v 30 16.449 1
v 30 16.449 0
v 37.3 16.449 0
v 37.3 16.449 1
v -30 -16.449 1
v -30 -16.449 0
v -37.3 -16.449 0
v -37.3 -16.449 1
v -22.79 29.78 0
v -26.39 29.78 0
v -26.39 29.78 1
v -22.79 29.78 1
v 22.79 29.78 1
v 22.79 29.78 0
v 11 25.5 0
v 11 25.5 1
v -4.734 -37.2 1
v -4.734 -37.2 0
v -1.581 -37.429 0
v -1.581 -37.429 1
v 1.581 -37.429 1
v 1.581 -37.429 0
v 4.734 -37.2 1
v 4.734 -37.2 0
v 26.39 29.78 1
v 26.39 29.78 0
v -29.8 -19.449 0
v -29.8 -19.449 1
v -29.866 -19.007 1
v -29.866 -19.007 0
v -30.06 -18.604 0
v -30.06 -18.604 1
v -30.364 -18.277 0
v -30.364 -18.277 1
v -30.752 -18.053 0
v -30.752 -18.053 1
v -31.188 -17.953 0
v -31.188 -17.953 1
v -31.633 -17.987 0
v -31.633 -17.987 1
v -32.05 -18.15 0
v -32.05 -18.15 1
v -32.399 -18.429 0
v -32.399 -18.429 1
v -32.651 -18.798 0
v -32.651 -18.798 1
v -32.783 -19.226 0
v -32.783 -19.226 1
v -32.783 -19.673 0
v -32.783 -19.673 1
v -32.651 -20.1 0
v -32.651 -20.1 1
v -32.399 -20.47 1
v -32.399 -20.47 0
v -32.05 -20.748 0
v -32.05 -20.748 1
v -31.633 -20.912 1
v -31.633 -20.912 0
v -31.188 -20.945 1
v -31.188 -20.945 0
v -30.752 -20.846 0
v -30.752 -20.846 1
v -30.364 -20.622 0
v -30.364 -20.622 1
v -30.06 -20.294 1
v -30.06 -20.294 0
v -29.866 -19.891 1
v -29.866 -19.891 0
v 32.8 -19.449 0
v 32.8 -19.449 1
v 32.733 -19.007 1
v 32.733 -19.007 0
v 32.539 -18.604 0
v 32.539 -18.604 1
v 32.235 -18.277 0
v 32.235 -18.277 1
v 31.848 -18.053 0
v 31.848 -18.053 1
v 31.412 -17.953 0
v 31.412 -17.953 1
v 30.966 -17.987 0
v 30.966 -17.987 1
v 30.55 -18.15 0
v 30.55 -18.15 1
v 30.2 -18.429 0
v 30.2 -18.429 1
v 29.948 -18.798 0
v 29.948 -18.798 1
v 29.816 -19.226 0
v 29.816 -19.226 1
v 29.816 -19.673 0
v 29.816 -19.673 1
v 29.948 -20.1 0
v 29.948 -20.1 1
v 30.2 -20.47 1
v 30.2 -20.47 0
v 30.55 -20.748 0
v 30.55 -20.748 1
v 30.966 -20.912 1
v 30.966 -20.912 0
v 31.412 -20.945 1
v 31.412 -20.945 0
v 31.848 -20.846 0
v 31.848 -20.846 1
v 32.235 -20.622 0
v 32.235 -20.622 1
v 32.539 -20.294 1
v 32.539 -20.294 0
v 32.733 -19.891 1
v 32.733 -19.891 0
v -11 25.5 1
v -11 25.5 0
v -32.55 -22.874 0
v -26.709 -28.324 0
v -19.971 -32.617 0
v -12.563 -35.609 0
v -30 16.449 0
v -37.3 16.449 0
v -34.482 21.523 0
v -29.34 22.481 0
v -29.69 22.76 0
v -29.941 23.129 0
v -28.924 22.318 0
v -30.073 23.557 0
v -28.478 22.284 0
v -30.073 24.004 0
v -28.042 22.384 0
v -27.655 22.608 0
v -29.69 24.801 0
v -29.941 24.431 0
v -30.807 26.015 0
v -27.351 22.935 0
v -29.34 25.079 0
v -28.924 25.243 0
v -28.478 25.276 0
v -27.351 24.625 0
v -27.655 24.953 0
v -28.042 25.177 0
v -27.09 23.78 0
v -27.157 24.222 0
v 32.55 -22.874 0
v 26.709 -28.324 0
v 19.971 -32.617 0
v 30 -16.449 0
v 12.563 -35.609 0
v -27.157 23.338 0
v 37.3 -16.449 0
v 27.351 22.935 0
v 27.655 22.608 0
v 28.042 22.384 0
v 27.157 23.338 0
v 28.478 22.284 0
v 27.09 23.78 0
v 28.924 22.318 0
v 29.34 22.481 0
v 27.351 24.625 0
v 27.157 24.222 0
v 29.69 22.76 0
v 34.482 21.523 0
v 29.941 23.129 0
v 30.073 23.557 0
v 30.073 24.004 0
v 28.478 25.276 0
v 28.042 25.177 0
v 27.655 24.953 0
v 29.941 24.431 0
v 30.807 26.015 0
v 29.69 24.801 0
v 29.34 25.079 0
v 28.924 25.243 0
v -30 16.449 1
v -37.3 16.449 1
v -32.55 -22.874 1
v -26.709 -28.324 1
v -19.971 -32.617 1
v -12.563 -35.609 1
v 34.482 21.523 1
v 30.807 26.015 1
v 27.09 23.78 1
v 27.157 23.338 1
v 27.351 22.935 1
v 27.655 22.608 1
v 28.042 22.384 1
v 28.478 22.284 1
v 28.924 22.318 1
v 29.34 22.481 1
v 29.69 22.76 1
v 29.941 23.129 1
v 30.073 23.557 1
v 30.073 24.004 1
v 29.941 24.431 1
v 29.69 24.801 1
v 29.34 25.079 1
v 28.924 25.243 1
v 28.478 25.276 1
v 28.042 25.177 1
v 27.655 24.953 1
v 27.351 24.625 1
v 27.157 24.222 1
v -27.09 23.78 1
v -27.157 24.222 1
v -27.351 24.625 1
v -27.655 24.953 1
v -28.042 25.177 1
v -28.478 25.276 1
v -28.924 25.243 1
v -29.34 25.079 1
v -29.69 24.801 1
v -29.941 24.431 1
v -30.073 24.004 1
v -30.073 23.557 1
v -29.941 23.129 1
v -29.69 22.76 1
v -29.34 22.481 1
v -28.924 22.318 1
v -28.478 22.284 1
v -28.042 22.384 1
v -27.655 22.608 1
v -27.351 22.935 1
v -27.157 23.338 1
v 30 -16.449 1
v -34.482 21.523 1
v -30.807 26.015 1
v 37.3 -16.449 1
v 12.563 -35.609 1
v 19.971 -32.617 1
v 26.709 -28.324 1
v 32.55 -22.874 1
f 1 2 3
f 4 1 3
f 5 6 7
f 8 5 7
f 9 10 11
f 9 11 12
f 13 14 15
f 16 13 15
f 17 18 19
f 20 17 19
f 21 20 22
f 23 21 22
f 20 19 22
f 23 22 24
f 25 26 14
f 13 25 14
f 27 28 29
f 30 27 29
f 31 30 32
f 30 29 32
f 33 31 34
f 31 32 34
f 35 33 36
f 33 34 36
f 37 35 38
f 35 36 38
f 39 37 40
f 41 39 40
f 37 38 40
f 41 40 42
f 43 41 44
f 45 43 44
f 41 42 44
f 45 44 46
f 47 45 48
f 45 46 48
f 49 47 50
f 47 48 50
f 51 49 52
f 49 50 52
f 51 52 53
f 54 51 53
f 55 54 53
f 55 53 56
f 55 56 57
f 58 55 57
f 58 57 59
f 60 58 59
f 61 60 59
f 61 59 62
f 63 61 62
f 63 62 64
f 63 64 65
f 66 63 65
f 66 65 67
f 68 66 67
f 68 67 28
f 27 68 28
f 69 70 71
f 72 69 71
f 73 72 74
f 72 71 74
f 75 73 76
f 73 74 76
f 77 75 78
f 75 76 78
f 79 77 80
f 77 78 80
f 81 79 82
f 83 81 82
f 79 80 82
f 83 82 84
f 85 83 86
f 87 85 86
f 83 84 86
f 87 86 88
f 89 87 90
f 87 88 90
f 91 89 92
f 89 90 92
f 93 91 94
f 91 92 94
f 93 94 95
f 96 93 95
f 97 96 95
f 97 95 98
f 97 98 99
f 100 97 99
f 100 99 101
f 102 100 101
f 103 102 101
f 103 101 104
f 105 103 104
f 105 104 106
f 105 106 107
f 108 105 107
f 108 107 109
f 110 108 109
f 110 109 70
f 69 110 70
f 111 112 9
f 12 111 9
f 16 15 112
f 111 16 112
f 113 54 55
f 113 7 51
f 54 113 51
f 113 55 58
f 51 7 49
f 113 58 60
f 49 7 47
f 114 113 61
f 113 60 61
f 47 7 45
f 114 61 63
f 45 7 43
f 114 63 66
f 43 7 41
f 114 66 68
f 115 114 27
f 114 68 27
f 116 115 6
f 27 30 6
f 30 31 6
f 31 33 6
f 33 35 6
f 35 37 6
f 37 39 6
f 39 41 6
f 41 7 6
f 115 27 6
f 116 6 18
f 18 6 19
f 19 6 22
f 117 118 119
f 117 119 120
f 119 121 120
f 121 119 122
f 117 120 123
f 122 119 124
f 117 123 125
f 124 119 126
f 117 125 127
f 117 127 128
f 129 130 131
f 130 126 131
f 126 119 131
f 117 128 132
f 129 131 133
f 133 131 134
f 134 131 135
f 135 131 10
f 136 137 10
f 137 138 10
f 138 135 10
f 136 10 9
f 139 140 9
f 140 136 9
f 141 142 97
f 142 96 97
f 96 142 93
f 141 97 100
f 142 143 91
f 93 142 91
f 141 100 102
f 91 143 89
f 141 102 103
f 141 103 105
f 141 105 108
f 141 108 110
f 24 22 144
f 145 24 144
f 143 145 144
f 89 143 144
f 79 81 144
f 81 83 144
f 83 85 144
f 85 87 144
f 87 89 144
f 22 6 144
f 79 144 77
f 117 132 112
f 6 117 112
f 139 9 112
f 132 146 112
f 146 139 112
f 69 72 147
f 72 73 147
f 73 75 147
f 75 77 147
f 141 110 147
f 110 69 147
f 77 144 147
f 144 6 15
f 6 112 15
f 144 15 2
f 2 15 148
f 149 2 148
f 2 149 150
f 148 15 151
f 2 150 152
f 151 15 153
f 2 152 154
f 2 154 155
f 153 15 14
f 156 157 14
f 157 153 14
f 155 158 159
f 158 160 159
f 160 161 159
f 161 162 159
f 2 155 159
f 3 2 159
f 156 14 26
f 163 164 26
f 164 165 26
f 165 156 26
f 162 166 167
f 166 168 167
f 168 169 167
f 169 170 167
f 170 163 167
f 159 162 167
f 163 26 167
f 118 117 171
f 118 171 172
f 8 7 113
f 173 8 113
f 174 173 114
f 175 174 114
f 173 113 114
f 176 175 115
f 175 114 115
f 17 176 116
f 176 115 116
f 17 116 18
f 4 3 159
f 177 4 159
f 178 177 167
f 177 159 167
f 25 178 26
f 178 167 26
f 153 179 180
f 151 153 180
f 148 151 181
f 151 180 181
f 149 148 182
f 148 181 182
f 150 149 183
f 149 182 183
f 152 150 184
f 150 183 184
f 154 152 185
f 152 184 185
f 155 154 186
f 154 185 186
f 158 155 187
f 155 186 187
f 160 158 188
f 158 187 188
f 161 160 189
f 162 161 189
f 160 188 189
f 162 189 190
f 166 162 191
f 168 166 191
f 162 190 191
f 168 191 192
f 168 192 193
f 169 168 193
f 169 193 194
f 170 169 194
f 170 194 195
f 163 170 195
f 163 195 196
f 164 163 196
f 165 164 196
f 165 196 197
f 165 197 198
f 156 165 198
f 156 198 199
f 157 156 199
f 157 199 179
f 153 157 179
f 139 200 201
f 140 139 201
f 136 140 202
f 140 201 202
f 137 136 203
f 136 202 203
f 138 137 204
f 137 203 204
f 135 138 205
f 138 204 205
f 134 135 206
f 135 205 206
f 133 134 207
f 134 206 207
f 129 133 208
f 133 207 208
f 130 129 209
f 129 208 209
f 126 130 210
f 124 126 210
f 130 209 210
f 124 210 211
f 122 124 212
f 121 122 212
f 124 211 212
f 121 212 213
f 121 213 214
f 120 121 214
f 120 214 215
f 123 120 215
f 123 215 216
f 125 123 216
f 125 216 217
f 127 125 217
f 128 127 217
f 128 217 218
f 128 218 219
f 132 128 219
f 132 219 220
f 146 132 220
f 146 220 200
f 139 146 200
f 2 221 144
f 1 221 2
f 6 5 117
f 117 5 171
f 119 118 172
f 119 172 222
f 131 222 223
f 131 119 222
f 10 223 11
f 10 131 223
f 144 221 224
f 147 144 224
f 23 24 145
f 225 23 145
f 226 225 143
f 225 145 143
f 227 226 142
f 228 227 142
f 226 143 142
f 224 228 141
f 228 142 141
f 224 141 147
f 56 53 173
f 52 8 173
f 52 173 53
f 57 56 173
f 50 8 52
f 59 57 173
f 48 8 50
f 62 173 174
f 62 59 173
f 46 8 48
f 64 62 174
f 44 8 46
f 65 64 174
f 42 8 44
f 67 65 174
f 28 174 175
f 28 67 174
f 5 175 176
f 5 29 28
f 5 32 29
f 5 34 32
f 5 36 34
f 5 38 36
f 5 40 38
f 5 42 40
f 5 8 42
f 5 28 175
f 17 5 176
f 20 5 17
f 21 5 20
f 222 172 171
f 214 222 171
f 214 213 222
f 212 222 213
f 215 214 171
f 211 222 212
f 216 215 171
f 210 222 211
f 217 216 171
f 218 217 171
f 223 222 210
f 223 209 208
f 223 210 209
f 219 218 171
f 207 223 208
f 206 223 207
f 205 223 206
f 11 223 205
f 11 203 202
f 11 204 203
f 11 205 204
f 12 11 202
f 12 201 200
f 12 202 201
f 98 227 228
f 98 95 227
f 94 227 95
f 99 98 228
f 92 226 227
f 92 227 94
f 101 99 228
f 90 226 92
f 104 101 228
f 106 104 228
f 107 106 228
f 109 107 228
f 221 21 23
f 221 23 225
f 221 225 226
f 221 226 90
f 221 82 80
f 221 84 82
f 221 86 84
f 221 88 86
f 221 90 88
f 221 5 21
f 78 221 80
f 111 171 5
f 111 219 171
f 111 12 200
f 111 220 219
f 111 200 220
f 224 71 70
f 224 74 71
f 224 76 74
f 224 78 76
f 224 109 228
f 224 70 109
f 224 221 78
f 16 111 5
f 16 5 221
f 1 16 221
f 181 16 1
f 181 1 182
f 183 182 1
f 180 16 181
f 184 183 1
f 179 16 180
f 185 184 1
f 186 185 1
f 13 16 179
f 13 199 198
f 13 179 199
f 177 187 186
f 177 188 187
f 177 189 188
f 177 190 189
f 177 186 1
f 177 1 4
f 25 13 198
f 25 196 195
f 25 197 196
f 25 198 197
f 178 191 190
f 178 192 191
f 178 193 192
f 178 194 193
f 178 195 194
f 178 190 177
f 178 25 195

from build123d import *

# Parameters (mm, degrees)
BOSS_EXTRUDE1_DEPTH = 3
SKETCH2_R           = 1.5
CUT_EXTRUDE3_DEPTH  = 3
CUT_EXTRUDE4_START  = -10
CUT_EXTRUDE4_DEPTH  = 10
BOSS_EXTRUDE2_START = -3
BOSS_EXTRUDE2_DEPTH = 3
SKETCH5_W           = 0.56
SKETCH5_H           = 32.898596714
CUT_EXTRUDE5_DEPTH  = 3
SKETCH6_W           = 0.2
SKETCH6_H           = 32.898596714
CUT_EXTRUDE6_DEPTH  = 3
SKETCH7_R           = 2
CUT_EXTRUDE8_DEPTH  = 3
BOSS_EXTRUDE3_START = -3
BOSS_EXTRUDE3_DEPTH = 3
CUT_EXTRUDE9_START  = -3
CUT_EXTRUDE9_DEPTH  = 3
BOSS_EXTRUDE5_START = -3
BOSS_EXTRUDE5_DEPTH = 3
SKETCH11_R          = 1.5
CUT_EXTRUDE10_DEPTH = 3
CUT_EXTRUDE11_DEPTH = 3
SKETCH13_W          = 7
SKETCH13_H          = 1.5
CUT_EXTRUDE12_DEPTH = 3
SKETCH14_R          = 2
SKETCH14_R_2        = 1.5
SKETCH14_W          = 7
SKETCH14_H          = 1.5
BOSS_EXTRUDE6_DEPTH = 3
CUT_EXTRUDE13_START = -2
CUT_EXTRUDE13_DEPTH = 2
SKETCH16_R          = 1.5
CUT_EXTRUDE14_DEPTH = 2


with BuildPart() as part:
    # Sketch1 → Boss-Extrude1 (new body)
    with BuildSketch(Plane.XY):
        with BuildLine():
            Line((-11, 25.5), (-22.790038711, 29.780264196))
            ThreePointArc((-22.790038711, 29.780264196), (0, -37.5), (22.790038711, 29.780264196))
            Line((22.790038711, 29.780264196), (11, 25.5))
            Line((11, 25.5), (-11, 25.5))
        make_face()
    extrude(amount=BOSS_EXTRUDE1_DEPTH)

    # Sketch2 → Cut-Extrude3 (cut)
    with BuildSketch(Plane.XY.offset(3)):
        with Locations((-25.400000001, 10.496905453)):
            Circle(SKETCH2_R)
        with Locations((-25.399981845, -10.493094547)):
            Circle(SKETCH2_R)
        with Locations(Location((25.399981845, -10.493094547, 0), (0, 0, 180))):
            Circle(SKETCH2_R)
        with Locations(Location((25.400000001, 10.496905453, 0), (0, 0, 180))):
            Circle(SKETCH2_R)
    extrude(amount=-CUT_EXTRUDE3_DEPTH, mode=Mode.SUBTRACT)

    # Sketch3 → Cut-Extrude4 (cut)
    with BuildSketch(Plane.XY.offset(3).offset(CUT_EXTRUDE4_START)):
        with BuildLine():
            Line((-30.76, 21.449298357), (-30.76, -21.449298357))
            ThreePointArc((-30.76, -21.449298357), (-37.5, 0), (-30.76, 21.449298357))
        make_face()
        with BuildLine():
            Line((30.76, 21.449298357), (30.76, -21.449298357))
            ThreePointArc((30.76, -21.449298357), (37.5, 0), (30.76, 21.449298357))
        make_face()
    extrude(amount=CUT_EXTRUDE4_DEPTH, mode=Mode.SUBTRACT)

    # Sketch4 → Boss-Extrude2 (add)
    with BuildSketch(Plane.XY.offset(3).offset(BOSS_EXTRUDE2_START)):
        with BuildLine():
            Line((-30.76, -21.449298357), (-30.76, -16.449298357))
            Line((-30.76, -16.449298357), (-33.699711921, -16.449298357))
            ThreePointArc((-33.699711921, -16.449298357), (-32.32667034, -19.006219634), (-30.76, -21.449298357))
        make_face()
        with BuildLine():
            Line((-33.699711921, 16.449298357), (-30.76, 16.449298357))
            Line((-30.76, 16.449298357), (-30.76, 21.449298357))
            ThreePointArc((-30.76, 21.449298357), (-32.32667034, 19.006219634), (-33.699711921, 16.449298357))
        make_face()
        with BuildLine():
            Line((30.76, 21.449298357), (30.76, 16.449298357))
            Line((30.76, 16.449298357), (33.699711921, 16.449298357))
            ThreePointArc((33.699711921, 16.449298357), (32.32667034, 19.006219634), (30.76, 21.449298357))
        make_face()
        with BuildLine():
            Line((30.76, -16.449298357), (30.76, -21.449298357))
            ThreePointArc((30.76, -21.449298357), (32.32667034, -19.006219634), (33.699711921, -16.449298357))
            Line((33.699711921, -16.449298357), (30.76, -16.449298357))
        make_face()
    extrude(amount=BOSS_EXTRUDE2_DEPTH)

    # Sketch5 → Cut-Extrude5 (cut)
    with BuildSketch(Plane.XY.offset(3)):
        with Locations((-30.48, 0)):
            Rectangle(SKETCH5_W, SKETCH5_H)
        with Locations((30.48, 0)):
            Rectangle(SKETCH5_W, SKETCH5_H)
    extrude(amount=-CUT_EXTRUDE5_DEPTH, mode=Mode.SUBTRACT)

    # Sketch6 → Cut-Extrude6 (cut)
    with BuildSketch(Plane.XY.offset(3)):
        with Locations((-30.1, 0)):
            Rectangle(SKETCH6_W, SKETCH6_H)
        with Locations((30.1, 0)):
            Rectangle(SKETCH6_W, SKETCH6_H)
    extrude(amount=-CUT_EXTRUDE6_DEPTH, mode=Mode.SUBTRACT)

    # Sketch7 → Cut-Extrude8 (cut)
    with BuildSketch(Plane.XY.offset(3)):
        with Locations((-19.15, -21.55)):
            Circle(SKETCH7_R)
        with Locations(Location((19.15, -21.55, 0), (0, 0, 180))):
            Circle(SKETCH7_R)
    extrude(amount=-CUT_EXTRUDE8_DEPTH, mode=Mode.SUBTRACT)

    # Sketch8 → Boss-Extrude3 (add)
    with BuildSketch(Plane.XY.offset(3).offset(BOSS_EXTRUDE3_START)):
        with BuildLine():
            Line((-33.699711921, 16.449298357), (-37.299711921, 16.449298357))
            ThreePointArc((-37.299711921, 16.449298357), (-32.744884003, 23.851322108), (-26.390038711, 29.780264196))
            Line((-26.390038711, 29.780264196), (-22.790038711, 29.780264196))
            ThreePointArc((-22.790038711, 29.780264196), (-29.020710607, 23.749702226), (-33.699711921, 16.449298357))
        make_face()
        with BuildLine():
            Line((33.699711921, 16.449298357), (37.299711921, 16.449298357))
            ThreePointArc((37.299711921, 16.449298357), (32.744884003, 23.851322108), (26.390038711, 29.780264196))
            Line((26.390038711, 29.780264196), (22.790038711, 29.780264196))
            ThreePointArc((22.790038711, 29.780264196), (29.020710607, 23.749702226), (33.699711921, 16.449298357))
        make_face()
    extrude(amount=BOSS_EXTRUDE3_DEPTH)

    # Sketch9 → Cut-Extrude9 (cut)
    with BuildSketch(Plane.XY.offset(3).offset(CUT_EXTRUDE9_START)):
        with BuildLine():
            Line((4.733920151, -37.2), (-4.733920151, -37.2))
            ThreePointArc((-4.733920151, -37.2), (0, -37.5), (4.733920151, -37.2))
        make_face()
    extrude(amount=CUT_EXTRUDE9_DEPTH, mode=Mode.SUBTRACT)

    # Sketch10 → Boss-Extrude5 (add)
    with BuildSketch(Plane.XY.offset(3).offset(BOSS_EXTRUDE5_START)):
        with BuildLine():
            ThreePointArc((-4.733920151, -37.2), (-21.838816892, -30.484685938), (-33.699711921, -16.449298357))
            Line((-33.699711921, -16.449298357), (-37.299711921, -16.449298357))
            ThreePointArc((-37.299711921, -16.449298357), (-23.43831182, -30.624902723), (-4.733920151, -37.2))
        make_face()
        with BuildLine():
            ThreePointArc((33.699711921, -16.449298357), (21.838816892, -30.484685938), (4.733920151, -37.2))
            ThreePointArc((4.733920151, -37.2), (23.43831182, -30.624902723), (37.299711921, -16.449298357))
            Line((37.299711921, -16.449298357), (33.699711921, -16.449298357))
        make_face()
        with BuildLine():
            Line((4.733920151, -37.2), (-4.733920151, -37.2))
            ThreePointArc((-4.733920151, -37.2), (0, -37.457659609), (4.733920151, -37.2))
        make_face()
    extrude(amount=BOSS_EXTRUDE5_DEPTH)

    # Sketch11 → Cut-Extrude10 (cut)
    with BuildSketch(Plane.XY.offset(3)):
        with Locations((-28.590038711, 23.780264196)):
            Circle(SKETCH11_R)
        with Locations(Location((28.590038711, 23.780264196, 0), (0, 0, 180))):
            Circle(SKETCH11_R)
    extrude(amount=-CUT_EXTRUDE10_DEPTH, mode=Mode.SUBTRACT)

    # Sketch12 → Cut-Extrude11 (cut)
    with BuildSketch(Plane.XY.offset(3)):
        Polygon((-22.005113558, -26.391105244), (-15.660959049, -29.349433076), (-16.294886442, -30.708894756), (-22.639040951, -27.750566924), align=None)
        Polygon((22.005113558, -26.391105244), (15.660959049, -29.349433076), (16.294886442, -30.708894756), (22.639040951, -27.750566924), align=None)
    extrude(amount=-CUT_EXTRUDE11_DEPTH, mode=Mode.SUBTRACT)

    # Sketch13 → Cut-Extrude12 (cut)
    with BuildSketch(Plane.XY.offset(3)):
        with Locations((-17.400000001, 9.496905453)):
            Rectangle(SKETCH13_W, SKETCH13_H)
        with Locations((17.400000001, 9.496905453)):
            Rectangle(SKETCH13_W, SKETCH13_H)
    extrude(amount=-CUT_EXTRUDE12_DEPTH, mode=Mode.SUBTRACT)

    # Sketch14 → Boss-Extrude6 (add)
    with BuildSketch(Plane.XY.offset(3)):
        with Locations((-19.15, -21.55)):
            Circle(SKETCH14_R)
        with Locations((19.15, -21.55)):
            Circle(SKETCH14_R)
        with Locations((-25.399981845, -10.493094547)):
            Circle(SKETCH14_R_2)
        with Locations((-25.400000001, 10.496905453)):
            Circle(SKETCH14_R_2)
        with Locations((25.400000001, 10.496905453)):
            Circle(SKETCH14_R_2)
        with Locations((25.399981845, -10.493094547)):
            Circle(SKETCH14_R_2)
        Polygon((-22.005113558, -26.391105244), (-22.639040951, -27.750566924), (-16.294886442, -30.708894756), (-15.660959049, -29.349433076), align=None)
        with Locations((-17.400000001, 9.496905453)):
            Rectangle(SKETCH14_W, SKETCH14_H)
        with Locations((17.400000001, 9.496905453)):
            Rectangle(SKETCH14_W, SKETCH14_H)
        Polygon((16.294886442, -30.708894756), (15.660959049, -29.349433076), (22.005113558, -26.391105244), (22.639040951, -27.750566924), align=None)
    extrude(amount=-BOSS_EXTRUDE6_DEPTH)

    # Sketch15 → Cut-Extrude13 (cut)
    with BuildSketch(Plane.XY.offset(3).offset(CUT_EXTRUDE13_START)):
        with BuildLine():
            Line((-37.299711921, 16.449298357), (-30, 16.449298357))
            Line((-30, 16.449298357), (-30, -16.449298357))
            Line((-30, -16.449298357), (-37.299711921, -16.449298357))
            ThreePointArc((-37.299711921, -16.449298357), (0, -37.457659609), (37.299711921, -16.449298357))
            Line((37.299711921, -16.449298357), (30, -16.449298357))
            Line((30, -16.449298357), (30, 16.449298357))
            Line((30, 16.449298357), (37.299711921, 16.449298357))
            ThreePointArc((37.299711921, 16.449298357), (32.744884003, 23.851322108), (26.390038711, 29.780264196))
            Line((26.390038711, 29.780264196), (22.790038711, 29.780264196))
            Line((22.790038711, 29.780264196), (11, 25.5))
            Line((11, 25.5), (-11, 25.5))
            Line((-11, 25.5), (-22.790038711, 29.780264196))
            Line((-22.790038711, 29.780264196), (-26.390038711, 29.780264196))
            ThreePointArc((-26.390038711, 29.780264196), (-32.744884003, 23.851322108), (-37.299711921, 16.449298357))
        make_face()
    extrude(amount=CUT_EXTRUDE13_DEPTH, mode=Mode.SUBTRACT)

    # Sketch16 → Cut-Extrude14 (cut)
    with BuildSketch(Plane.XY.offset(1)):
        with Locations((-31.299711921, -19.449298357)):
            Circle(SKETCH16_R)
        with Locations((31.299711921, -19.449298357)):
            Circle(SKETCH16_R)
    extrude(amount=-CUT_EXTRUDE14_DEPTH, mode=Mode.SUBTRACT)


solid = part.part
